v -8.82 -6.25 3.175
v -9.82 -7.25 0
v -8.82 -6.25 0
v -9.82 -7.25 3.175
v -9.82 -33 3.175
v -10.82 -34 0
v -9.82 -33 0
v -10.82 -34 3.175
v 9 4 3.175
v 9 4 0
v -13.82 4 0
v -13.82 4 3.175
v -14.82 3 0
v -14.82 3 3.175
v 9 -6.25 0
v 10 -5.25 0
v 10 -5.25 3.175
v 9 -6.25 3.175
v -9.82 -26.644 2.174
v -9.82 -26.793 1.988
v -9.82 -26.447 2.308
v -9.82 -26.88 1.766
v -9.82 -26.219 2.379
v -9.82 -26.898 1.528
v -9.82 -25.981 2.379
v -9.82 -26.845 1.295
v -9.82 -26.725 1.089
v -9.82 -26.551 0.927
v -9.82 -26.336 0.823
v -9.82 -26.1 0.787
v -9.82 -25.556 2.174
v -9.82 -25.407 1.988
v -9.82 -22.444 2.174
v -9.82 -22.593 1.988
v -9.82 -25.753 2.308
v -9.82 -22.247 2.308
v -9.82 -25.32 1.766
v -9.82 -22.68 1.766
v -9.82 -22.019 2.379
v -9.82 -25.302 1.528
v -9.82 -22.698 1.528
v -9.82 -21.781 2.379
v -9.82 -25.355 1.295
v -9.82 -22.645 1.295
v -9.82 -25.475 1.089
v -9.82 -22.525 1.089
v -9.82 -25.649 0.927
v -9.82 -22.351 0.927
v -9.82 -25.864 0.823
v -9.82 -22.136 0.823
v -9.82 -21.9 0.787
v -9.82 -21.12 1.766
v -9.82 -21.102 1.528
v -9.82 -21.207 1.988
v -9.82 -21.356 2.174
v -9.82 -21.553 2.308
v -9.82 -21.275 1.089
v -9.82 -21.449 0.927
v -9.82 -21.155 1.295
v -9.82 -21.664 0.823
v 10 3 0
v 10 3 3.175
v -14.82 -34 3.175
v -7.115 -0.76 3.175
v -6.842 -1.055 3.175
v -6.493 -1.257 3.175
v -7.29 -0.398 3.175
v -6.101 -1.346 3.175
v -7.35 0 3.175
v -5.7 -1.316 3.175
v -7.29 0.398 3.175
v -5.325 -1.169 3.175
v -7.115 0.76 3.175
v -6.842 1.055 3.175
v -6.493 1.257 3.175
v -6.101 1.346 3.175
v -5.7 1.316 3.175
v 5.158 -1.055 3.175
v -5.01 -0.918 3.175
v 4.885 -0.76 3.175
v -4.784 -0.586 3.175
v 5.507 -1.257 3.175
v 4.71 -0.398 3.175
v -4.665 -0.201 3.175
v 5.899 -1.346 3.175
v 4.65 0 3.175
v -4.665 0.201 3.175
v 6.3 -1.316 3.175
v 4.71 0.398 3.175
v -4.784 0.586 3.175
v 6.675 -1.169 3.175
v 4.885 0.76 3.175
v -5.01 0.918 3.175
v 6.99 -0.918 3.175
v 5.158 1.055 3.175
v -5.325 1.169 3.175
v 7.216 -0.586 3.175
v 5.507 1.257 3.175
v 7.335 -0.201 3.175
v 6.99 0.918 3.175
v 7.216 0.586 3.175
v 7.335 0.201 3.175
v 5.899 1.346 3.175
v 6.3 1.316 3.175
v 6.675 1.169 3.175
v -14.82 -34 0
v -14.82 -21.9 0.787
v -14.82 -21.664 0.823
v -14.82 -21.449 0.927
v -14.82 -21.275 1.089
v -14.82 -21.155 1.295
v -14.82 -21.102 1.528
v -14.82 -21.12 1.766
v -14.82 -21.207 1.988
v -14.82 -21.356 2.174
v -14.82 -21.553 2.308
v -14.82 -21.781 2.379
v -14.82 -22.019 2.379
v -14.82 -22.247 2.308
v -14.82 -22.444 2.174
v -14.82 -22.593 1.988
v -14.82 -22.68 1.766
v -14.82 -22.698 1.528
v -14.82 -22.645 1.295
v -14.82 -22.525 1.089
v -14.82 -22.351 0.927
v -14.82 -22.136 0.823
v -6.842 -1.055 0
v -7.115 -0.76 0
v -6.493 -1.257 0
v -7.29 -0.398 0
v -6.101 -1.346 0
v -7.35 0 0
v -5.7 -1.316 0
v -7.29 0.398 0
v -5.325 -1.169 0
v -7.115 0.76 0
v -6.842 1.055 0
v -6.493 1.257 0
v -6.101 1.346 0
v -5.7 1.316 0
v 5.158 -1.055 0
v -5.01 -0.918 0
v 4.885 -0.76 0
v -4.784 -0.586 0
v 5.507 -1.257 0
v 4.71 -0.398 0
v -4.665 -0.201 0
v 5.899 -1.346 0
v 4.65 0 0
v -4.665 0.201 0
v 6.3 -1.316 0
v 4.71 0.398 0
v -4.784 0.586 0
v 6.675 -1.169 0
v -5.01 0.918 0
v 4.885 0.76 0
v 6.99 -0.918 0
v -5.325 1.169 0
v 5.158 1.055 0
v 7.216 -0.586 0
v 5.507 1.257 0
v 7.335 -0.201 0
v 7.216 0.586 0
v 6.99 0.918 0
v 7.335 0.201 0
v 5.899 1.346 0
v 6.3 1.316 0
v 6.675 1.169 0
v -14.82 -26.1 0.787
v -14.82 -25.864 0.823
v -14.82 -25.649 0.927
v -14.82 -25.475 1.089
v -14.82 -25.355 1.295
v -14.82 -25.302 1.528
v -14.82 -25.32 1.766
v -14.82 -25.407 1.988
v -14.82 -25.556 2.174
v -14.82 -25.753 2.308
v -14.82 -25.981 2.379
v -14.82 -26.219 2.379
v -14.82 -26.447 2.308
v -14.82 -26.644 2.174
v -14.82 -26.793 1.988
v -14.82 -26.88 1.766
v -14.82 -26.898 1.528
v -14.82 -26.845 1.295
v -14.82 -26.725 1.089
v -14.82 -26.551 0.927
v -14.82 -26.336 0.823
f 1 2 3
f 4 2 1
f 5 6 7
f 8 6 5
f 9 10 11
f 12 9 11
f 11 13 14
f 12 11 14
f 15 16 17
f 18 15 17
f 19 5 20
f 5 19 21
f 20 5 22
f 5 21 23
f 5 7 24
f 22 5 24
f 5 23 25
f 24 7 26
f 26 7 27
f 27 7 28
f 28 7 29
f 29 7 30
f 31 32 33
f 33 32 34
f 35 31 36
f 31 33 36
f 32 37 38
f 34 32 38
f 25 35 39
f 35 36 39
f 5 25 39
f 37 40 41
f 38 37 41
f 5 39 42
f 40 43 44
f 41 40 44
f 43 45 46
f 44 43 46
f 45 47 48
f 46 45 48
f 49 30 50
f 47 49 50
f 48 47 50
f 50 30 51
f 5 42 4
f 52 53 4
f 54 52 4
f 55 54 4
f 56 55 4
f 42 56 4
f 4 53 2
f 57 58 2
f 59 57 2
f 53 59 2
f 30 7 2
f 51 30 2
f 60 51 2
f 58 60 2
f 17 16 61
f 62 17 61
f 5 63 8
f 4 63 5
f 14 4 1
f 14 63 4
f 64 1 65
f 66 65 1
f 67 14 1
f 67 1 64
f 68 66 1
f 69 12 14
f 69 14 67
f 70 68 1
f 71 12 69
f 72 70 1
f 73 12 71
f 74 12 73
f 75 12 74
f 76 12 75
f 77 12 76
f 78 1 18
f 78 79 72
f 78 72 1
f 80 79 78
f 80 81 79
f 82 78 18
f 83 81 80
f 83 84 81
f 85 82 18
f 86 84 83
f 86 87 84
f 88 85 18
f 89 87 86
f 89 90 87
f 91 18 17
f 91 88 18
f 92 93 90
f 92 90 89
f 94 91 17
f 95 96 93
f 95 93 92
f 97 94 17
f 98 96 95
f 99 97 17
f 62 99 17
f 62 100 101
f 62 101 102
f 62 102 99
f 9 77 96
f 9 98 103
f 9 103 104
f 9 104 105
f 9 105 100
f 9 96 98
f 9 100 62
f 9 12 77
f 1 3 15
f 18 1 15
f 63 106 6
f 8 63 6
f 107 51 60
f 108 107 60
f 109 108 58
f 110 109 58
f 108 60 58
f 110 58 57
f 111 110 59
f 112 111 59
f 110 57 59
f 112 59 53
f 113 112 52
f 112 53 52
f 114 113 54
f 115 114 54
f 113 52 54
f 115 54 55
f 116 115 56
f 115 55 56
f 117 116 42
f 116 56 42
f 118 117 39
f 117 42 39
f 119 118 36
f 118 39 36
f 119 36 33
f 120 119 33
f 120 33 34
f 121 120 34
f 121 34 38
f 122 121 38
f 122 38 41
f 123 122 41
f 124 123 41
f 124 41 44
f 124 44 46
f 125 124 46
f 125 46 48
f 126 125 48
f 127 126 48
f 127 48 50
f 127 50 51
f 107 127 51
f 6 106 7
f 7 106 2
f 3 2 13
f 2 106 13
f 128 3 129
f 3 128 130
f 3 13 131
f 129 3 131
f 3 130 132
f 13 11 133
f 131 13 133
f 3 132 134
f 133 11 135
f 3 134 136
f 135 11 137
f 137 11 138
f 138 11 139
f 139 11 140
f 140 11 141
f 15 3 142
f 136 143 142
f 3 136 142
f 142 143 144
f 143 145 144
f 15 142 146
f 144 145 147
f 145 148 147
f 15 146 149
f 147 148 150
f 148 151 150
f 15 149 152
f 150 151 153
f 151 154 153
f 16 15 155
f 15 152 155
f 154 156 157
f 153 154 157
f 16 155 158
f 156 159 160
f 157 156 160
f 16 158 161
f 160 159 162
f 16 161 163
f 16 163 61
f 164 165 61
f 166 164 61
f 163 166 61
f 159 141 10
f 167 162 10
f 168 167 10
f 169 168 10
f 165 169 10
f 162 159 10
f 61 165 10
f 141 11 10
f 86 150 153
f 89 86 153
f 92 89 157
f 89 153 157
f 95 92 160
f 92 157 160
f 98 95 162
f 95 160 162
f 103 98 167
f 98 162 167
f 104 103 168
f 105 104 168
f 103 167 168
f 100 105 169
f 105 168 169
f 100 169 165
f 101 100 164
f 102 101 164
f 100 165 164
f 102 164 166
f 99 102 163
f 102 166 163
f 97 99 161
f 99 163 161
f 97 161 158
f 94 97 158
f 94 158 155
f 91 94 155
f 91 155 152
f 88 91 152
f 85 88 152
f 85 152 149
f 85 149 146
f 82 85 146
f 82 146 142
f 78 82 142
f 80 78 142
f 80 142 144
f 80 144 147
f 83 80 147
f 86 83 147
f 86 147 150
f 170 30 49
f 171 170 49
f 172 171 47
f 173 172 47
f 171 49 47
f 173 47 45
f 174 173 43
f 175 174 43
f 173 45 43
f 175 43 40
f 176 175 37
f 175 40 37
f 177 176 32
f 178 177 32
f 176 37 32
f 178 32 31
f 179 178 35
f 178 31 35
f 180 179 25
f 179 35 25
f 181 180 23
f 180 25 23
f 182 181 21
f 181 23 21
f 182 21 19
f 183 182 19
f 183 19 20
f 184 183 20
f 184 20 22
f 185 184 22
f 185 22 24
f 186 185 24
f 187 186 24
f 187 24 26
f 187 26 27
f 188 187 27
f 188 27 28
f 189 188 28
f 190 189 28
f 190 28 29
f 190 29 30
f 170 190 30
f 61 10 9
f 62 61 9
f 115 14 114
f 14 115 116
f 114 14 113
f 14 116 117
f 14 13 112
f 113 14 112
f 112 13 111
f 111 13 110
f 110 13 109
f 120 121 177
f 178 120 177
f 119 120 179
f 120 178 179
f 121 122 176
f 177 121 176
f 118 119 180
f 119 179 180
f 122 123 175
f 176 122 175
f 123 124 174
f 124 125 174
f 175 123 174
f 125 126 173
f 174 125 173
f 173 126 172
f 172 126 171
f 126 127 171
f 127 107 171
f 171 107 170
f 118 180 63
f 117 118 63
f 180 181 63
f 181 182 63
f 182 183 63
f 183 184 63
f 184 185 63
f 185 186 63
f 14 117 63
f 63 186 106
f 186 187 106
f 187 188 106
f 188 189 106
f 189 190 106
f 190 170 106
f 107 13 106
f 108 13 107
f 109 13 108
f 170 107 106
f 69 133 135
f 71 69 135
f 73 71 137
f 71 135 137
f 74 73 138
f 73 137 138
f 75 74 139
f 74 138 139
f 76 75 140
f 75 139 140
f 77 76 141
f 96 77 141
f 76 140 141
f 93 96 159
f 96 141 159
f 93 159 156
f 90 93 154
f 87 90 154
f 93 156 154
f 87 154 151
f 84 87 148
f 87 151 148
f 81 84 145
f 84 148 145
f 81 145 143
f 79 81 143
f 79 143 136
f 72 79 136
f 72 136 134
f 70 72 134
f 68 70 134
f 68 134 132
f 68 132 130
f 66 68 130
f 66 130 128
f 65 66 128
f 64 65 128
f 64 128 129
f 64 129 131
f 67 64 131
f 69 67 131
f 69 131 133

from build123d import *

# Parameters (mm, degrees)
BOSS_EXTRUDE1_DEPTH         = 3.175
M2_5_CLEARANCE_HOLE1_D      = 2.7
CHAMFER1_SIZE               = 1
TAP_DRILL_FOR_M2X0_4_TAP1_D = 1.6


with BuildPart() as part:
    # Sketch2 → Boss-Extrude1 (new body)
    with BuildSketch(Plane.XY):
        Polygon((-9.82, -6.25), (10, -6.25), (10, 4), (-14.82, 4), (-14.82, -34), (-9.82, -34), align=None)
    extrude(amount=BOSS_EXTRUDE1_DEPTH)

    # M2.5 Clearance Hole1 (through all)
    with Locations(Plane.XY.offset(3.175)):
        with Locations((-6, 0), (6, 0)):
            Hole(M2_5_CLEARANCE_HOLE1_D / 2)

    # Chamfer1
    chamfer1_edges = [part.edges().sort_by_distance(p)[0] for p in [
        (-9.82, -34, 1.5875),
        (-14.82, 4, 1.5875),
        (10, 4, 1.5875),
        (10, -6.25, 1.5875),
        (-9.82, -6.25, 1.5875),
    ]]
    chamfer(chamfer1_edges, length=CHAMFER1_SIZE)

    # Tap Drill for M2x0.4 Tap1 (through all)
    with Locations(Plane.ZY.offset(14.82)):
        with Locations((1.5875, -21.9), (1.5875, -26.1)):
            Hole(TAP_DRILL_FOR_M2X0_4_TAP1_D / 2)


solid = part.part
